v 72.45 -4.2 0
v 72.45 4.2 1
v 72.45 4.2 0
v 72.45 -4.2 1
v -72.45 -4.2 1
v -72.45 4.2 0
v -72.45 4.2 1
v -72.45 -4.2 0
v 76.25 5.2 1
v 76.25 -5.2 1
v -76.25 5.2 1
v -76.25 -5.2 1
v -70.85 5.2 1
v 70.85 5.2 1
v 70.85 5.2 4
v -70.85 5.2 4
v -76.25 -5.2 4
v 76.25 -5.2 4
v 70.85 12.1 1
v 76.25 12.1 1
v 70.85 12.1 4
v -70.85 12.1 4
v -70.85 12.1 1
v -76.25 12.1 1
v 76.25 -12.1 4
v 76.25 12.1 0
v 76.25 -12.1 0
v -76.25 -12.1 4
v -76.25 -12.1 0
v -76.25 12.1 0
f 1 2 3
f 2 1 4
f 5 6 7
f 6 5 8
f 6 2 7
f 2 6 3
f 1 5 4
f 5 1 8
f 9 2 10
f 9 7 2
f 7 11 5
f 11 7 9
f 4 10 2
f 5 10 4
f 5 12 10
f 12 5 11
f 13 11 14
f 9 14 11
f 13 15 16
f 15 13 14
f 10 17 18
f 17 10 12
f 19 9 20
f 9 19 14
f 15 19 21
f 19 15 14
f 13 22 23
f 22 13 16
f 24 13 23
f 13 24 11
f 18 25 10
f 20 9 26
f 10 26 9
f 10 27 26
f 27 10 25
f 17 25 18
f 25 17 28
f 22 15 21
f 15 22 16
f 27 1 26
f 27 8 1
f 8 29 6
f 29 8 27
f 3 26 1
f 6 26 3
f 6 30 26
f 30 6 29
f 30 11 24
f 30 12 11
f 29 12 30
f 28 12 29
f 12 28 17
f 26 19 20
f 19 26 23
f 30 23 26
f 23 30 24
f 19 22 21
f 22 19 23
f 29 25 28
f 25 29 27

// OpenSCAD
// -*- mode: SCAD ; c-file-style: "ellemtel" ; coding: utf-8 -*-
//
// Holder for Minox film strips
//
// A holder for Minox 11 picture film strips for use with generic flatbed
// scanners with a transparency unit and holder for 135 (35 mm) film.
//
// (c) 2018 Roland Sieker <ospalh@gmail.com>
// Licence: CC-BY-SA 4.0


// ... to preview. You will get all parts when you click "Create Thing".
part = "Halter"; // [Halter: Halter, Klemme: Klemme]

// Set this to "render" and click on "Create Thing" when done with the setup.
preview = 1; // [0:render, 1:preview]
// I put this in every design, but it shouldn't make a difference on this one.

w_loch = 24.6;
// w_streifen = 16;  // real width
w_streifen = 9.6;  // slightly more so the movable part becomes more stable
w_bild = 8;
l_bild = 13.1;
bilder_ps = 11;


p_h = 1;
p_k = 3;

/* [Hidden] */

// Done with the customizer

// *******************************************************
// Extra parameters. These can be changed reasonably safely.


// w = 1.8;  // Wall width
// p = 1.2;  // Bottom, top plate height
c = 0.4;  // Clearance
c_x = 0.4;
angle = 60; // Overhangs much below 60 degrees are a problem for me

// *******************************************************
// Some shortcuts. These shouldn't be changed

tau = 2 * PI;  // pi is still wrong. tau = circumference / r

xy_factor = 1/tan(angle);
// To get from a height to a horizontal width inclined correctly
z_factor = tan(angle);  // The other way around

w_halter = w_loch - c;
w_k = w_streifen + c;
w_nut = w_k + c;
w_steg = (w_halter - w_nut) / 2;
w_x = 1.8;
b_nase = 3;
b_nnut = b_nase + c_x;
l_streifen = l_bild * bilder_ps;
l_loch_k = l_streifen + c;
l_loch_h = l_loch_k + c;
l_k = l_loch_k + 2 * w_x + c;
l_halter = l_k  + c + 2 * w_x;
w_loch_h = w_bild + c;
h_halter = p_h + p_k;

xo_o = l_k/2 - b_nase;

some_distance = 0.6 * w_halter +  w_streifen + w_steg;
ms = 0.01;  // Muggeseggele.

// fn for differently sized objects and fs, fa; all for preview or rendering.
pna = 40;
pnb = 15;
pa = 5;
ps = 1;
rna = 180;
rnb = 30;
ra = 1;
rs = 0.1;
function na() = (preview) ? pna : rna;
function nb() = (preview) ? pnb : rnb;
$fs = (preview) ? ps : rs;
$fa = (preview) ? pa : ra;

// *******************************************************
// End setup



// *******************************************************
// Generate the parts

print_part();
// preview_parts();
// stack_parts();


module print_part()
{
   if ("Halter" == part)
   {
      halter();
   }
   if ("Klemme" == part)
   {
      klemme();
   }
}

module preview_parts()
{
   halter();
   translate([0, some_distance, 0])
   {
      klemme();
   }
}

module stack_parts()
{
   // intersection()
   {
      color("yellow")
      {
         halter();
      }
      translate([0, 0, p_h+2*ms])
      {
         color("red")
         {
            klemme();
         }
      }
   }
}

// *******************************************************
// Code for the parts themselves


module halter()
{
   difference()
   {
      translate([0, 0, h_halter/2])
      {
         cube([l_halter, w_halter, h_halter], center=true);
      }
      filmloch_halter();
   }
}

module filmloch_halter()
{
   cube([l_loch_h, w_loch_h, 2*h_halter+2*ms], center=true);
   translate([0,0, p_h+p_k/2+ms])
   {
      cube([l_halter+2*ms, w_nut, p_k+2*ms], center=true);
   }
   eine_kerbe();
   mirror()
   {
      eine_kerbe();
   }
}


module klemme()
{
   difference()
   {
      translate([0,0, p_k/2])
      {
         cube([l_k, w_streifen, p_k], center=true);
      }
      cube([l_streifen, w_bild, 3*p_k], center=true);
   }
   eine_nase();
   mirror()
   {
      eine_nase();
   }
}


module eine_nase()
{
   translate([xo_o, w_streifen/2-ms, 0])
   {
      cube([b_nase, w_steg + 0.5*c, p_k+ms]);
   }
}

module eine_kerbe()
{
   translate([xo_o-c_x, w_nut/2-ms, p_h])
   {
      cube([b_nase+2*w_x+2*c_x, w_steg + c + ms, p_k+ms]);
   }
}
